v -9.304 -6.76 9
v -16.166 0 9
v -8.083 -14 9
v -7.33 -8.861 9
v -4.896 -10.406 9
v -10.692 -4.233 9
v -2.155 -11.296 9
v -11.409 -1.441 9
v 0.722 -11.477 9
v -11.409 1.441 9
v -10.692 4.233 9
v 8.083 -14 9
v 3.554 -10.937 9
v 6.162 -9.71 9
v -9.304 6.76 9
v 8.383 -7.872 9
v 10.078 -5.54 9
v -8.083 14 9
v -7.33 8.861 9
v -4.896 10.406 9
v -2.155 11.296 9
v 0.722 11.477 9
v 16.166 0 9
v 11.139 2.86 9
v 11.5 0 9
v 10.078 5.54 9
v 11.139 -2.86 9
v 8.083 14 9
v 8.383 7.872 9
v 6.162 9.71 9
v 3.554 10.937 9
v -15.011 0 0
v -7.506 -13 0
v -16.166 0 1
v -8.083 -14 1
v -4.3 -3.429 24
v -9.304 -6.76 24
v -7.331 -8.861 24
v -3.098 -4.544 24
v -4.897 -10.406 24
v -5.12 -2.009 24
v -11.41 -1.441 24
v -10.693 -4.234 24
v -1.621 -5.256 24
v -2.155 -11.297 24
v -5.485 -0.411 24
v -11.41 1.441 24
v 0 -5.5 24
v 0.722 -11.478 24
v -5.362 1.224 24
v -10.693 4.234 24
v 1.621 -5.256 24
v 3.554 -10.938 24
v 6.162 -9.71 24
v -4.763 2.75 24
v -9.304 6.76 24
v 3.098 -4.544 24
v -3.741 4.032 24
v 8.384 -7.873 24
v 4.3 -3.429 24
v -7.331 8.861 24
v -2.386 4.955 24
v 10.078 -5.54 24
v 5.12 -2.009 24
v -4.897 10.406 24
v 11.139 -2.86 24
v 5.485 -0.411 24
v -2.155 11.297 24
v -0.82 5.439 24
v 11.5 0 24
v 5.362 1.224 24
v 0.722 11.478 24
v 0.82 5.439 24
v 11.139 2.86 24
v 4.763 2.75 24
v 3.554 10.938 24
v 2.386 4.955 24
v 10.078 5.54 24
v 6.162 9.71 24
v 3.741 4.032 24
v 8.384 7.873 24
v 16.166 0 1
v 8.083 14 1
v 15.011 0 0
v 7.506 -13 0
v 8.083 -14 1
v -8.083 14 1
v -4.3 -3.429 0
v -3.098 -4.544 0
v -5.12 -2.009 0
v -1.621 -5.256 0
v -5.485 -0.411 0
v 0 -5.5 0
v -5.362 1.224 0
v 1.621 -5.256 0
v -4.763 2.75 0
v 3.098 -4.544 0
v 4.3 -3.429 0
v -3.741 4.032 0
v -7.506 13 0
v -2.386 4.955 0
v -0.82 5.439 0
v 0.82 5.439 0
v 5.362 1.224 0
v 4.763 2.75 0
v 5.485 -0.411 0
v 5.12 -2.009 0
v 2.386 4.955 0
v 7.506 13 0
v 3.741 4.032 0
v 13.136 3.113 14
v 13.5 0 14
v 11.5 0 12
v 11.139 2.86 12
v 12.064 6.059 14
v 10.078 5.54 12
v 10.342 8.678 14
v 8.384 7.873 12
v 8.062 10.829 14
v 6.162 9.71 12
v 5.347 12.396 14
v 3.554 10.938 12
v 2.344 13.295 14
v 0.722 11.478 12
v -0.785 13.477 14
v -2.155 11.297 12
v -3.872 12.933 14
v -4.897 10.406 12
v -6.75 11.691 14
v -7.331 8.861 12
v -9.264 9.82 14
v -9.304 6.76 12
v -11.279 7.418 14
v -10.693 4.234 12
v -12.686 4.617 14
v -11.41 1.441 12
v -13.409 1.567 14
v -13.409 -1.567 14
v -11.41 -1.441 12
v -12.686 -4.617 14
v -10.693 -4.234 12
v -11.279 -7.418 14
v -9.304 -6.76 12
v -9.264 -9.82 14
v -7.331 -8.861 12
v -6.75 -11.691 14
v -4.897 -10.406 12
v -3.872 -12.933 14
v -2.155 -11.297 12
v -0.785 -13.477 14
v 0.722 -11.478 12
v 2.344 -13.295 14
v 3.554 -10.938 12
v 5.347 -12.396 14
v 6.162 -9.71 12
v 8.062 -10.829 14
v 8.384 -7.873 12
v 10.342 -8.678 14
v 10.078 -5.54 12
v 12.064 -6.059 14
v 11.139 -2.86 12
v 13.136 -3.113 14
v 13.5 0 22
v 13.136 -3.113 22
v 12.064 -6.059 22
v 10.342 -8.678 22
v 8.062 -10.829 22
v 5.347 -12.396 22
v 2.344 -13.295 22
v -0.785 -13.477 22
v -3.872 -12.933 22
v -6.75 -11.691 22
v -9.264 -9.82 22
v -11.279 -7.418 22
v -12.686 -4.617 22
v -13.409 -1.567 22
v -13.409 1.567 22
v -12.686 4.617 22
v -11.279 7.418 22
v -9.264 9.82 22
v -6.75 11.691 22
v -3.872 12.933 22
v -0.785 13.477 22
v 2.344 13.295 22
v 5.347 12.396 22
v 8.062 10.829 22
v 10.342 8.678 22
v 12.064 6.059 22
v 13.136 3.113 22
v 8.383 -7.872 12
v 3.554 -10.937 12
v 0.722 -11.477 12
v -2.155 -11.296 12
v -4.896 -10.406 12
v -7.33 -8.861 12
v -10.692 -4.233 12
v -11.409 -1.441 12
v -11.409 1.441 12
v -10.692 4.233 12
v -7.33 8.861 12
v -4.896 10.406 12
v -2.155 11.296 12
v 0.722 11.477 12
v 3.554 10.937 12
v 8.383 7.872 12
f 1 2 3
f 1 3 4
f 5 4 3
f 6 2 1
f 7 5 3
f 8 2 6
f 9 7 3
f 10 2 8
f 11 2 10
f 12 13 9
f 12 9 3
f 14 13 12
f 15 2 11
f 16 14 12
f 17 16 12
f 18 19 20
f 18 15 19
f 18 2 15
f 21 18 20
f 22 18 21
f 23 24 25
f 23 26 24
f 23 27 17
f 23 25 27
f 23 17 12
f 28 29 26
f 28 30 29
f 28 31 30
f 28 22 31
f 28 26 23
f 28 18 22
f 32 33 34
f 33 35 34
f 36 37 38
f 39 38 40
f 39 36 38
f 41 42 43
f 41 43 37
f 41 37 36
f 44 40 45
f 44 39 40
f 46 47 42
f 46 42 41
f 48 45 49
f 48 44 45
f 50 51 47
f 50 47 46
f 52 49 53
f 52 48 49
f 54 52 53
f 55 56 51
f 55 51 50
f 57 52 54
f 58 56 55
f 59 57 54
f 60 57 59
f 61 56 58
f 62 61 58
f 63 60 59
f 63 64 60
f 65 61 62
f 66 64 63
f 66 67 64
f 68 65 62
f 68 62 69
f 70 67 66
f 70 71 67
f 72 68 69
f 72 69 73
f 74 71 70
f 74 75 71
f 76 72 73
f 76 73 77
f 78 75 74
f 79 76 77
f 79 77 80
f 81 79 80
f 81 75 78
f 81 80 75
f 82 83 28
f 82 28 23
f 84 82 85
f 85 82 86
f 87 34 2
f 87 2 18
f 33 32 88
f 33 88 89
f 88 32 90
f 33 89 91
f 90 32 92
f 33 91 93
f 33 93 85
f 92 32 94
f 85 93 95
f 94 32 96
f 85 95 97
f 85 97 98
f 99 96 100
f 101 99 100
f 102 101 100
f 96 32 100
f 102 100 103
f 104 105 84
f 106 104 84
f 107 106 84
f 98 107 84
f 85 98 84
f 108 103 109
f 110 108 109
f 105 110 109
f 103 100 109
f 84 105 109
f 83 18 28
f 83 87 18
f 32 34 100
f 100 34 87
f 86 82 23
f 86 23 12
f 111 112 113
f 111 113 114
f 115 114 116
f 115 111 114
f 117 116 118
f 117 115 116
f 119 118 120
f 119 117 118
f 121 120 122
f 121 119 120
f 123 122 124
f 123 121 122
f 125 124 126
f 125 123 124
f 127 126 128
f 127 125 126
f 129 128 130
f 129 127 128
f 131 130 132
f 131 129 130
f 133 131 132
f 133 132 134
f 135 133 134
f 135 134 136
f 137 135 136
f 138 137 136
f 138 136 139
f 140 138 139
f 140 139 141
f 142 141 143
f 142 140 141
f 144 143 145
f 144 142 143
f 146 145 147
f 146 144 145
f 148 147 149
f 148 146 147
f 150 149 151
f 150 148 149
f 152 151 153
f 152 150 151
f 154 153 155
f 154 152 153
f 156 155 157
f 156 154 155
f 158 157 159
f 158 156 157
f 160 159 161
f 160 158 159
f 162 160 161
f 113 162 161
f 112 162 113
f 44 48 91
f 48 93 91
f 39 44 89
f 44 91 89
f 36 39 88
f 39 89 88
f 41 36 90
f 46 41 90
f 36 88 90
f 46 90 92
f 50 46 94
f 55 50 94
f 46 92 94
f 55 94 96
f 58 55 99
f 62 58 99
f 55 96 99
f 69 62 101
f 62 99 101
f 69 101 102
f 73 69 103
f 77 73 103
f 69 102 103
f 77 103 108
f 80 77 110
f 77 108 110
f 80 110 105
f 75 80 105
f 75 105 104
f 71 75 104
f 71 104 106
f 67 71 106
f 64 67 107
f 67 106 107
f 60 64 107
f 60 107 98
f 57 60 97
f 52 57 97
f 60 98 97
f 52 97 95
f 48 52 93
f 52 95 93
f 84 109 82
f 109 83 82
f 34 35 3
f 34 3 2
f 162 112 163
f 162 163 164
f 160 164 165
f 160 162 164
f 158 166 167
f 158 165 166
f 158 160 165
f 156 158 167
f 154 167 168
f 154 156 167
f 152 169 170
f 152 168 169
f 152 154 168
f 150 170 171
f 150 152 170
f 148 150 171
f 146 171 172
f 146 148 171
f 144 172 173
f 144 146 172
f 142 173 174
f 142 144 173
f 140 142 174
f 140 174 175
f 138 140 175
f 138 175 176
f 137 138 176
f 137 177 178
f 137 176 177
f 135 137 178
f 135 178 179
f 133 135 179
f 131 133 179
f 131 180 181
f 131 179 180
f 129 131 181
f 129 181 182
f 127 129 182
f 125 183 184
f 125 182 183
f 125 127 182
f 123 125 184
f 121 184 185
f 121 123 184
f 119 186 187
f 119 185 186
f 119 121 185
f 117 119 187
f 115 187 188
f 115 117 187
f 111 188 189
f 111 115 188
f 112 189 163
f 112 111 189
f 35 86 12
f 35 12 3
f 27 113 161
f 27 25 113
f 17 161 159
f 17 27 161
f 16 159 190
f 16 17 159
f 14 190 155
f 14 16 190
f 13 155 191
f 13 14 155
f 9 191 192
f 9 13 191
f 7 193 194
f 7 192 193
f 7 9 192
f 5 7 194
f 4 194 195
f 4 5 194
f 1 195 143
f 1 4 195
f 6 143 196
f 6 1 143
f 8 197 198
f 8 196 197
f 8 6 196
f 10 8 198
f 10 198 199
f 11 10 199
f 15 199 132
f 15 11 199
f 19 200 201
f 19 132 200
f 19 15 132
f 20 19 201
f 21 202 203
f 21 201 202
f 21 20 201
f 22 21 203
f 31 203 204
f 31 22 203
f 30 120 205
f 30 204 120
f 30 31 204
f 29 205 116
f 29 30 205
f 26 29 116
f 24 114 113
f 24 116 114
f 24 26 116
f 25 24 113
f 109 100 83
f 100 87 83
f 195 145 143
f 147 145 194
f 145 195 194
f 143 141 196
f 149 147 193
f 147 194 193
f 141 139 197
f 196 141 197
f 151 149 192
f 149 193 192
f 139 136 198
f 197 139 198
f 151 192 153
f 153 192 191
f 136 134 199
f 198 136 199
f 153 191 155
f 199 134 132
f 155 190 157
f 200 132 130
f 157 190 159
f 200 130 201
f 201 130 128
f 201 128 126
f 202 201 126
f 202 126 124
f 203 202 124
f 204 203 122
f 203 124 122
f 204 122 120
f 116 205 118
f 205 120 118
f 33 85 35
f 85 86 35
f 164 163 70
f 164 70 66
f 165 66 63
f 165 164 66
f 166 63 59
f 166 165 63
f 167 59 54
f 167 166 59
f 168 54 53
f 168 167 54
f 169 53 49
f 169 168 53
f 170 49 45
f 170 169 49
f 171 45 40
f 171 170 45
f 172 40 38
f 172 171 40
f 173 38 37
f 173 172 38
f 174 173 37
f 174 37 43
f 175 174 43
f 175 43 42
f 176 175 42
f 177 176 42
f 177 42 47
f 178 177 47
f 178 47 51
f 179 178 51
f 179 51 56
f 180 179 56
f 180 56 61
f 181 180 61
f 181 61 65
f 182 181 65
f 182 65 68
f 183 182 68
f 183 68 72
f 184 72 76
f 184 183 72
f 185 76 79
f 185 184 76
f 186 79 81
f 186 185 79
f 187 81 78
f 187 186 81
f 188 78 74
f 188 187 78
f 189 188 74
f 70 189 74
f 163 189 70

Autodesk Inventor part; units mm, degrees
ref_plane "YZ Plane" through (0, 0, 0) normal (1, 0, 0) x (0, 1, 0)
ref_plane "XZ Plane" through (0, 0, 0) normal (0, 1, 0) x (-1, 0, 0)
ref_plane "XY Plane" through (0, 0, 0) normal (0, 0, 1) x (1, 0, 0)
sketch "草图1" plane through (0, 0, 0) normal (0, 0, 1) x (1, 0, 0)
  line L0 (8.0829, 14) -> (16.1658, 0)
  line L1 (16.1658, 0) -> (8.0829, -14)
  line L2 (8.0829, -14) -> (-8.0829, -14)
  line L3 (-8.0829, -14) -> (-16.1658, 0)
  line L4 (-16.1658, 0) -> (-8.0829, 14)
  line L5 (-8.0829, 14) -> (8.0829, 14)
  point P0 (0, 0)
  point P1 (0, 0)
extrude "拉伸1" add sketch "草图1" along normal blind 9
sketch "草图2" plane through (0, 0, 9) normal (0, 0, 1) x (1, 0, 0)
  circle A0 centre (0, 0) radius 11.5
  dimension "d4" = 23
extrude "拉伸2" add sketch "草图2" along normal blind 3
sketch "草图3" plane through (0, 0, 12) normal (0, 0, 1) x (1, 0, 0)
  circle A0 centre (0, 0) radius 13.5
  dimension "d7" = 27
extrude "拉伸3" add sketch "草图3" along normal blind 12
chamfer "倒角1" distance 2 angle 45 2 edges at (-13.5, 0, 24) (-13.5, 0, 12)
sketch "草图4" plane through (0, 0, 24) normal (0, 0, 1) x (1, 0, 0)
  circle A0 centre (0, 0) radius 11.5 projected
hole "孔1" at (0, 0, 24) direction (0, 0, -1) diameter 11 end through all
thread "螺纹1" size "M27x3" designation "M27" class "6g" standard "GB Metric profile" length 48
chamfer "倒角2" distance 1 angle 45 6 edges at (12.1244, -7, 0) (12.1244, 7, 0) (0, 14, 0) (-12.1244, 7, 0) (0, -14, 0) (-12.1244, -7, 0)
properties part number "3-锁紧螺母" material "灰口铁"
